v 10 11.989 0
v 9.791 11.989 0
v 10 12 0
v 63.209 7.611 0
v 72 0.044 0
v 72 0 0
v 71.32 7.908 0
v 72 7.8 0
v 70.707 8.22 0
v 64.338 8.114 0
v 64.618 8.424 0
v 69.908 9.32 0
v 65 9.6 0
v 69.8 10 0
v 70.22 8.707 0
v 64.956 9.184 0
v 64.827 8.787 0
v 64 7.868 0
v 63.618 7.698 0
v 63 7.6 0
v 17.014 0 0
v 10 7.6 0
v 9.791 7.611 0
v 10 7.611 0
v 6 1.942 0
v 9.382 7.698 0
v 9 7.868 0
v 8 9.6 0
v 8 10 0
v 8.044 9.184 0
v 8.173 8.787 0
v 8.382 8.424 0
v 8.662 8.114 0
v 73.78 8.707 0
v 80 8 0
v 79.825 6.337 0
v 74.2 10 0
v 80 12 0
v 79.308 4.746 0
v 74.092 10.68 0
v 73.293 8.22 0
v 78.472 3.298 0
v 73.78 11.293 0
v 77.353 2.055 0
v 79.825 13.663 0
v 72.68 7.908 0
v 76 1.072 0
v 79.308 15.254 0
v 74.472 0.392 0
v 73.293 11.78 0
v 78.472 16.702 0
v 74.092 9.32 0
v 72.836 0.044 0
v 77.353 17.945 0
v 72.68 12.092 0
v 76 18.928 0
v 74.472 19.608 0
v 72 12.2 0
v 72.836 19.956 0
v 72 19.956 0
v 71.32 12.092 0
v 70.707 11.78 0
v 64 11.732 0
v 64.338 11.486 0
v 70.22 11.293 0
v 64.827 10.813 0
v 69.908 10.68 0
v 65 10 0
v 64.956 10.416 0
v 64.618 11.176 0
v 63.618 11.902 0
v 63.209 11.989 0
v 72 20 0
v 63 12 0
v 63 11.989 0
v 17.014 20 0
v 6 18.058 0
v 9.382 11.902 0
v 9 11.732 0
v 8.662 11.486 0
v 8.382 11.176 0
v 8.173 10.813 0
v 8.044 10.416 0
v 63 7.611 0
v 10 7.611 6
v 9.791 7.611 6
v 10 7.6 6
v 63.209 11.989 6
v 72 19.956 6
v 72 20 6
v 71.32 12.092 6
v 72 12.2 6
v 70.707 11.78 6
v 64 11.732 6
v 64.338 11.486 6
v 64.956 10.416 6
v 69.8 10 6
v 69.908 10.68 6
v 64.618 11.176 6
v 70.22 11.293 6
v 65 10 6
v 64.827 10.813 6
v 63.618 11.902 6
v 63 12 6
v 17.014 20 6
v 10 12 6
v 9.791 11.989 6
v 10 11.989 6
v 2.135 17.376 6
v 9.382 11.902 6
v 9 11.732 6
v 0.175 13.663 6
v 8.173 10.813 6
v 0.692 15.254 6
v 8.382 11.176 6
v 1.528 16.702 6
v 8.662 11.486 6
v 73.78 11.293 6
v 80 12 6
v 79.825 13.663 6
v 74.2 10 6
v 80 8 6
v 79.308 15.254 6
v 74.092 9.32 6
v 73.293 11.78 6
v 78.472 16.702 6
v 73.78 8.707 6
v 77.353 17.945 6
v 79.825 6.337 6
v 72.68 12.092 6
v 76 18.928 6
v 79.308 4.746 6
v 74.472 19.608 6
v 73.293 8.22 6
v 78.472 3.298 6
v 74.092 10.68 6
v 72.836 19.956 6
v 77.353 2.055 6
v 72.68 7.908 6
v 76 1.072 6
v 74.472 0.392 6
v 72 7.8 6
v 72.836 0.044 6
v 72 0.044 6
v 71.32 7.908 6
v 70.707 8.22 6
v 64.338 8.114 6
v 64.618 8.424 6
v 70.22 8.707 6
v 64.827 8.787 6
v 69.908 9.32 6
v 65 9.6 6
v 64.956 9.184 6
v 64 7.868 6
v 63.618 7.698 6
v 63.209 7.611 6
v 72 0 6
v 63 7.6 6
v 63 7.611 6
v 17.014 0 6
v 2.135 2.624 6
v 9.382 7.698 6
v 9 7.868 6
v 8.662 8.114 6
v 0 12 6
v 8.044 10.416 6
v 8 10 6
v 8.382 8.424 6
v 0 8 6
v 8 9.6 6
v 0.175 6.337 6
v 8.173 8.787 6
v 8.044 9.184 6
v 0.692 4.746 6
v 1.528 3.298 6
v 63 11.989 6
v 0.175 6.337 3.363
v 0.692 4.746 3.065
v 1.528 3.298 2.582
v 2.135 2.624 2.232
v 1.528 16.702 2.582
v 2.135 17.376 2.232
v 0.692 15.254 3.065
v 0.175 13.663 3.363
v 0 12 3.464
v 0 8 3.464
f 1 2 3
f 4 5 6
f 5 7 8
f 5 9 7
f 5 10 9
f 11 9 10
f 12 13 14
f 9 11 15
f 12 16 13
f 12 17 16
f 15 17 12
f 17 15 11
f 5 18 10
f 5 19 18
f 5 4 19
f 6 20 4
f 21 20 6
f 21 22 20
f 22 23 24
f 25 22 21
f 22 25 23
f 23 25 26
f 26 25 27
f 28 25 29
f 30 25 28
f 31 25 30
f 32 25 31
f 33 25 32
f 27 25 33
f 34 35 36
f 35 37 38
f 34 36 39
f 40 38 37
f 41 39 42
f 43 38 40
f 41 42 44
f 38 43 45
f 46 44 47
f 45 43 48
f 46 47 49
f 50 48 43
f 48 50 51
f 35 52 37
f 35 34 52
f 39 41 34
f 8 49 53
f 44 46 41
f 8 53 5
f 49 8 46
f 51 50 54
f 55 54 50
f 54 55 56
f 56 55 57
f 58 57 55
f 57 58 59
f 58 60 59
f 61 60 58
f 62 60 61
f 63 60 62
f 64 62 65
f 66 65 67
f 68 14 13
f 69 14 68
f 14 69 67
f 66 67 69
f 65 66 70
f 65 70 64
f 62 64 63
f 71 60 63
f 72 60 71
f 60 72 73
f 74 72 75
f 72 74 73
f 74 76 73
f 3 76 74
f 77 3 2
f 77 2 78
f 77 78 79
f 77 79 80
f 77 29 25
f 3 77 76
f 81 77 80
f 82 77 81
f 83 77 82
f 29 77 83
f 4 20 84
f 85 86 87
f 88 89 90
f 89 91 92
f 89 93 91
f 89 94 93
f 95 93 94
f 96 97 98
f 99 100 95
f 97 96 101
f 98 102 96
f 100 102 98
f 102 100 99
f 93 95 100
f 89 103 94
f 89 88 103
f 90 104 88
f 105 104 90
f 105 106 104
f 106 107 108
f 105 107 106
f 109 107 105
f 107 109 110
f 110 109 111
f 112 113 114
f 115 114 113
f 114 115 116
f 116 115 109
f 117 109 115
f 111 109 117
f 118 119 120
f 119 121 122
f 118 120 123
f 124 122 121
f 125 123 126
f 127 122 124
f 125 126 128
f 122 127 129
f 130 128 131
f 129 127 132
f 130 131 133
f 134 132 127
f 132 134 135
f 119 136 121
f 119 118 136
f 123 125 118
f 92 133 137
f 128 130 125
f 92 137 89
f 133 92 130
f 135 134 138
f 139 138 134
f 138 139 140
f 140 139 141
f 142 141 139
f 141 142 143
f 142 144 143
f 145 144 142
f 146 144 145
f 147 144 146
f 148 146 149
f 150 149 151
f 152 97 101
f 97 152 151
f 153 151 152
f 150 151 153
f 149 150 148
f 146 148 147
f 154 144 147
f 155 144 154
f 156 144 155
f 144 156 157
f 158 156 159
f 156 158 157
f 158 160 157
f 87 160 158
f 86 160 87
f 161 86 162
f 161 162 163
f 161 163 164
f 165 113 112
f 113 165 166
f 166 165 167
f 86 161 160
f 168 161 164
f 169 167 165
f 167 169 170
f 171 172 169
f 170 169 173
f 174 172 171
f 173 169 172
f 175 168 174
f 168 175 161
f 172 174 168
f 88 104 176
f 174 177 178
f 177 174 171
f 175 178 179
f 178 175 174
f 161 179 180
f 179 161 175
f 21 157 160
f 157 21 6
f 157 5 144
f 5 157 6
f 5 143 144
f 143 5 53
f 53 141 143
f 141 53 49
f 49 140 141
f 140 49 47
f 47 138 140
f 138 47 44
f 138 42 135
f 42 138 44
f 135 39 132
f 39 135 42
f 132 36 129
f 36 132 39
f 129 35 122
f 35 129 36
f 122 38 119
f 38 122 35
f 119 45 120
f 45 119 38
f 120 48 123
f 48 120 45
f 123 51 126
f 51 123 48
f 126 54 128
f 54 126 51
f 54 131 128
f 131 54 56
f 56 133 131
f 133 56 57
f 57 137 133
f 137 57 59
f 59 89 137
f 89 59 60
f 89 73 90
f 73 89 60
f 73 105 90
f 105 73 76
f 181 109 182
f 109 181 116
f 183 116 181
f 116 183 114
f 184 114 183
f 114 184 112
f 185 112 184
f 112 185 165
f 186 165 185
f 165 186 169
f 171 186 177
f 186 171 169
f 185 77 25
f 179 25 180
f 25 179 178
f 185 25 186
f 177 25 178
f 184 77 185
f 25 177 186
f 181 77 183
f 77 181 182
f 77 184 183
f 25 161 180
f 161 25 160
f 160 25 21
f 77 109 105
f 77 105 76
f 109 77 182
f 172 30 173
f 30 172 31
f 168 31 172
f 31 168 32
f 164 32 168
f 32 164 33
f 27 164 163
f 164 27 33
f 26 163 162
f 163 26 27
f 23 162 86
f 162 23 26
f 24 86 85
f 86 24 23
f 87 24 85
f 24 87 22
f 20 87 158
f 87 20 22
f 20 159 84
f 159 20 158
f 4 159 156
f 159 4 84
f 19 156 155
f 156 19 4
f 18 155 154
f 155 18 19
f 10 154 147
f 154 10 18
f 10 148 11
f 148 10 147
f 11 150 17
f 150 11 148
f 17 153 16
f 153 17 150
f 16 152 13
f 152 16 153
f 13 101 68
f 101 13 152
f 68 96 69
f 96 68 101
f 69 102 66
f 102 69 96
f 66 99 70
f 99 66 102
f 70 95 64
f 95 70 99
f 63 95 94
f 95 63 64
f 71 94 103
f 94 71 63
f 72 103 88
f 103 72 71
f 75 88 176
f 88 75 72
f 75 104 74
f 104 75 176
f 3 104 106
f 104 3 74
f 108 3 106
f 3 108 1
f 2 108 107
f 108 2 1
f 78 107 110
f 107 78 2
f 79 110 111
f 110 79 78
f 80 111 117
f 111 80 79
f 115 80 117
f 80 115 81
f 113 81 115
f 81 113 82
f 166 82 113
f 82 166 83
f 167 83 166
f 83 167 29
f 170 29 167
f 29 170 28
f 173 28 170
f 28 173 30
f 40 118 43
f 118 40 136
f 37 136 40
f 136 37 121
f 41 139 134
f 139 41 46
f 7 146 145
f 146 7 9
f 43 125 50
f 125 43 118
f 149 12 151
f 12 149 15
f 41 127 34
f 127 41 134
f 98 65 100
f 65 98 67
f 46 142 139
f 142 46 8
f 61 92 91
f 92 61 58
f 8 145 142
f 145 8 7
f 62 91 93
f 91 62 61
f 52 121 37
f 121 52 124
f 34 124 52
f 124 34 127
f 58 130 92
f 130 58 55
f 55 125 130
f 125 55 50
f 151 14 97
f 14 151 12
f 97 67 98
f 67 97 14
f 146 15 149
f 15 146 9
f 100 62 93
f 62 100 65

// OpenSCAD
hcw=80; // clamp width
hch=20; // clamp height
hcd=6;  // clamp depth
hclamp();
module rounded_rect(w,h,r) {
  translate([r,r]) circle(d=r*2,$fn=30);
  translate([r,h-r]) circle(d=r*2,$fn=30);
  translate([w-r,h-r]) circle(d=r*2,$fn=30);
  translate([w-r,r]) circle(d=r*2,$fn=30);
  translate([r,0]) square([w-r*2,h]);
  translate([0,r]) square([r,h-r*2]);
  translate([w-r,r]) square([r,h-r*2]);
}
module rounded_cube(w,h,d,rsides,rvert=0)
{
  if(rvert==0)
  {
    linear_extrude(d) rounded_rect(w,h,rsides);
  } else {
    translate([rsides,rsides,rvert]) scale([1,1,rvert/rsides]) minkowski() {
      cube([w-rsides*2,h-rsides*2,(d-rvert*2)/(rvert/rsides)]);
      sphere(rsides,$fn=30);
    }
  }
}
module hclamp() {
  difference(){
    rounded_cube(hcw,hch,hcd,8);
    translate([6,-.01]) mirror([1,0]) rotate([0,60]) cube([10,20.02,20]);
    translate([0,3,-.01]) mirror([0,1,0]) rotate([0,0,10]) cube(20);
    translate([0,17,-.01]) rotate([0,0,10]) cube(20);
    translate([8,7.6,-.01]) rounded_cube(hcw-23,4.4,8.02,2);
    translate([hcw-8,10,-.01]) cylinder(d=4.4,h=8.02,$fn=20);
  }
}
